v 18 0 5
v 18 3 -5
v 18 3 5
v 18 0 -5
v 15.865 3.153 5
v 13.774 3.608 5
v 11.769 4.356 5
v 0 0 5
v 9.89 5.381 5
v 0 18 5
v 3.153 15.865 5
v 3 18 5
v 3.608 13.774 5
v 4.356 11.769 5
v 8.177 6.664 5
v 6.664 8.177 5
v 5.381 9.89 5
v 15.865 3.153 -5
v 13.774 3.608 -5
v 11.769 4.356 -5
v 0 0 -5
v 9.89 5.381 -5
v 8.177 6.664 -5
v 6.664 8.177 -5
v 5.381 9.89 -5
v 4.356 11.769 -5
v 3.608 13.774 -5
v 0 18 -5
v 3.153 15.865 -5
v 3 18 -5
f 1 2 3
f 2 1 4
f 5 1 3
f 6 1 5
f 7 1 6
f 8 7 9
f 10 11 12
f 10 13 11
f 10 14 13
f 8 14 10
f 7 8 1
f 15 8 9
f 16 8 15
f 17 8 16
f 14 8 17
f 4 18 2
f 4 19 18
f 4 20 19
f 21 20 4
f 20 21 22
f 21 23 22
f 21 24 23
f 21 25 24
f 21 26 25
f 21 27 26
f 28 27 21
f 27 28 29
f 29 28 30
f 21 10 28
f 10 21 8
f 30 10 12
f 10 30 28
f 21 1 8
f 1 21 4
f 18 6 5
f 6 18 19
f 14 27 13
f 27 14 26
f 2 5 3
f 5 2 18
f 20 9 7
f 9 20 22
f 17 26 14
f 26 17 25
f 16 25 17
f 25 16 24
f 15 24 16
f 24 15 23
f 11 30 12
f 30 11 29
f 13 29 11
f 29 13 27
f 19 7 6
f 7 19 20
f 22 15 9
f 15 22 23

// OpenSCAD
// file: attach.scad
//---------------------------------------------------------------
//-- Openscad Attachment library
//-- Attach parts easily. Make your designs more reusable and clean
//---------------------------------------------------------------
//-- This is a component of the obiscad opescad tools by Obijuan
//-- (C) Juan Gonzalez-Gomez (Obijuan)
//-- Sep-2012
//---------------------------------------------------------------
//-- Released under the GPL license
//---------------------------------------------------------------

use <vector.scad>

//--------------------------------------------------------------------
//-- Draw a connector
//-- A connector is defined a 3-tuple that consist of a point
//--- (the attachment point), and axis (the attachment axis) and
//--- an angle the connected part should be rotate around the 
//--  attachment axis
//--
//--- Input parameters:
//--
//--  Connector c = [p , n, ang] where:
//--
//--     p : The attachment point
//--     v : The attachment axis
//--   ang : the angle
//--------------------------------------------------------------------
module connector(c)
{
  //-- Get the three components from the connector
  p = c[0];
  v = c[1];
  ang = c[2];

  //-- Draw the attachment poing
  color("Gray") point(p);

  //-- Draw the attachment axis vector (with a mark)
  translate(p)
    rotate(a=ang, v=v)
    color("Gray") vector(unitv(v)*6, l_arrow=2, mark=true);
}


//-------------------------------------------------------------------------
//--  ATTACH OPERATOR
//--  This operator applies the necesary transformations to the 
//--  child (attachable part) so that it is attached to the main part
//--  
//--  Parameters
//--    a -> Connector of the main part
//--    b -> Connector of the attachable part
//-------------------------------------------------------------------------
module attach(a,b)
{
  //-- Get the data from the connectors
  pos1 = a[0];  //-- Attachment point. Main part
  v    = a[1];  //-- Attachment axis. Main part
  roll = a[2];  //-- Rolling angle
  
  pos2 = b[0];  //-- Attachment point. Attachable part
  vref = b[1];  //-- Atachment axis. Attachable part
                //-- The rolling angle of the attachable part is not used

  //-------- Calculations for the "orientate operator"------
  //-- Calculate the rotation axis
  raxis = cross(vref,v);
    
  //-- Calculate the angle between the vectors
  ang = anglev(vref,v);
  //--------------------------------------------------------.-

  //-- Apply the transformations to the child ---------------------------

  //-- Place the attachable part on the main part attachment point
  translate(pos1)
    //-- Orientate operator. Apply the orientation so that
    //-- both attachment axis are paralell. Also apply the roll angle
    rotate(a=roll, v=v)  rotate(a=ang, v=raxis)
      //-- Attachable part to the origin
      translate(-pos2)
	child(0); 
}


//--------------------------------------------------------------------
//---   An example of the attach operator
//---  
//---  There are two parts: the main body and an arm
//---  They both are cubes (for simplicity)
//---
//--   In the main body there are 2 connectors defined, so that
//--  the arm can be attached to any of them (or both if you like)
//------------------------------------------------------------------

//-- In the debug mode the connectors and additional information
//-- are shown
debug=true;

//-- Define the Main part: A cube
//-- Two attachment points are defined: one on the top, another in the
//--- left side
size = [10,10,10];

//-- Connectors defined:

//--     Att. point       Att. Axis  Roll
c1 = [ [0,0,size[2]/2],  [0,0,1],     20];  //-- Connector on the top
c2 = [ [-size[0]/2,0,0], [-1,0,0],    90];  //-- Connector on the left


//-- Draw the main part along with the connectors (for debugging)
cube(size,center=true);

//-- In debug mode: Draw the main part connectors!
if (debug) {
  connector(c1);
  connector(c2);
}

//-- Define the Attachable part. It is another cube, with one connector
asize = [5,20,3];
a = [ [0,asize[1]/2-3,-asize[2]/2], [0,0,1], 0  ];


//-- Do the attach!
//-- Just change c1 by c2 to attach the part to the other 
//-- connector. Super-easy!! :-)
//-- Modify the c1 and c2 roll angle for rotating the attachable
//--  part to the desired orientation
attach(c1,a)
  //-- This is the attachable part! 
  union() {
    cube(asize,center=true);  //-- The part

    //-- In debug mode show additional info:
    if (debug) {
      frame(l=10);    //-- The part frame of reference.
      connector(a);   //-- Show the part connector
    }
  };

  
// main file
//---------------------------------------------------------------
//-- Openscad Bevel library
//-- Bevel the edges or add buttress to your parts!
//---------------------------------------------------------------
//-- This is a component of the obiscad opescad tools by Obijuan
//-- (C) Juan Gonzalez-Gomez (Obijuan)
//-- Sep-2012
//---------------------------------------------------------------
//-- Released under the GPL license
//---------------------------------------------------------------
use <vector.scad>
use <attach.scad>


//-----------------------------------------------------------------
//- Rotate a vector an angle teta around the axis given by the
//-- unit vector k
//-----------------------------------------------------------------
function Rot_axis_ang(p,k,teta) =
  p*cos(teta) + cross(k,p*sin(teta)) + k*dot(k,p)*(1-cos(teta));

//-- Transformation defined by rotating vfrom vector to vto
//-- It is applied to vector v
//-- It returns the transformed vector
function Tovector(vfrom, vto, v) = 
   Rot_axis_ang(v, unitv(cross(vfrom,vto)), anglev(vfrom,vto));

//-- Auxiliary function for extending a vector of 3 components to 4
function ev(v,c=0) = [v[0], v[1], v[2], c];

//-- Calculate the determinant of a matrix given by 3 row vectors
function det(a,b,c) = 
   a[0]*(b[1]*c[2]-b[2]*c[1])
 - a[1]*(b[0]*c[2]-b[2]*c[0])  
 + a[2]*(b[0]*c[1]-b[1]*c[0]);


//-- Sign function. It only returns 2 values: -1 when x is negative,
//-- or 1 when x=0 or x>0
function sign2(x) = sign(x)+1 - abs(sign(x));

//--------------------------------------------------------------------
//-- Beveled concave corner
//-- NOT AN INTERFACE MODULE (The user should call bconcave_corner instead)
//--
//-- Parameters:
//--   * cr: Corner radius
//--   * cres: Corner resolution
//--   * l: Length
//-    * th: Thickness
//--------------------------------------------------------------------
module bconcave_corner_aux(cr,cres,l,th)
{
  
  //-- vector for translating the  main cube
  //-- so that the top rigth corner is on the origin
  v1 = -[(cr+th)/2, (cr+th)/2, 0];

  //-- The part frame of reference is on the
  //-- internal corner
  v2 = [cr,cr,0];

  //-- Locate the frame of ref. in the internal
  //-- corner
  translate(v2)
  difference() {

    //-- Main cube for doing the corner
    translate(v1)
        //color("yellow",0.5)
        cube([cr+th, cr+th, l],center=true);
 
    //-- Cylinder used for beveling...
    cylinder(r=cr, h=l+1, center=true, $fn=4*(cres+1));
  }
}


//-----------------------------------------------------------------------------
//-- API MODULE
//--
//-- Beveled concave corner
//--
//-- Parameters:
//--   * cr: Corner radius
//--   * cres: Corner resolution
//--   * l: Length
//-    * th: Thickness
//--   * ext_corner: Where the origin is locate. By default it is located
//--       in the internal corner (concave zone). If true, 
//--       it will be in the external corner (convex zone)
//----------------------------------------------------------------------------
module bconcave_corner(cr=1,cres=4,th=1,l=10,ext_corner=false)
{
  //-- Locate the origin in the exterior edge
  if (ext_corner==true)
    translate([th,th,0]) 
      bconcave_corner_aux(cr,cres,l,th);
  else
     //-- Locate the origin in the interior edge
     translate([0.01, 0.01,0])
       bconcave_corner_aux(cr,cres,l,th);
}

//----------------------------------------------------------------------
//-- Auxiliary module (NOT FOR THE USER!)
//-- It is and standar "attach", particularized for placing concave
//-- corners
//----------------------------------------------------------------------
module bconcave_corner_attach_final(
        cfrom,  //-- Origin connector
        cto,    //-- Target connector
        cr,
        cres,
        l,
        th,
        ext_corner)
{
 
  //-- This block represent an attach operation
  //-- It is equivalent to:  attach(cto,cfrom)
  translate(cto[0])
    rotate(a=cto[2], v=cto[1])
      rotate(a=anglev(cfrom[1],cto[1]), 
             v=cross(cfrom[1],cto[1]) )
        translate(-cfrom[0]) 

  //-- Place the concave corner (along with some debug information)
  union() {
    //color("Blue")
    //connector(cfrom);
    //connector([cfrom[0],cnormal_v,0]);
    bconcave_corner(cr=cr,
             cres=cres, 
             l=l,
             th=th,
             ext_corner=ext_corner);
  }
}


//-------------------------------------------------------------------------
//-- Auxiliary module (NOT FOR THE USER!)
//-- It is the general module for performing the bconcave corner attach
//-- All the parameters should be passed to it
//--
//--  External connectors are where de concave corner will be placed. They
//--  are provided by the user
//--
//--  Internal connectors refers to the connectors of the concave corner
//--
//--  Then an attach between the internal and external connectors is done
//-------------------------------------------------------------------------
module bconcave_corner_attach_aux(

         //-- External connectors
         edge_c, 
         normal_c,

         //-- Internal connectors
         iedge_c,
         inormal_c,

	 //-- Other params
         cr,
         cres,
         th,
         l,
         ext_corner)

{
  //-- Get the Corner vectors from the internal connectors
  cedge_v = iedge_c[1];         //-- Corner edge vector
  cnormal_v = inormal_c[1];     //-- Corner normal vector

  //-- Get the vector paralell and normal to the edge
  //-- From the external connectors
  edge_v = edge_c[1];      //-- Edge verctor
  enormal_v = normal_c[1]; //-- Edge normal vector

  //---------------------------------------------------------------
  //-- For doing a correct attach, first the roll angle for the  
  //-- external connector should be calculated. It determines the
  //-- orientation of the concave corner around the edge vector
  //--
  //-- This orientation is calculated using the edge normal vectors
  //-- that bisec the corner
  //--
  //-- There are 2 different cases: depending on the relative angle
  //-- between the internal and external edges. They can be parallel
  //-- or not
  //-----------------------------------------------------------------
  //-- The roll angle has two components: the value and the sign

  //-- Calculate the sign of the rotation (the sign of roll)
  s=sign2(det(cnormal_v,enormal_v,edge_v));

  //-- Calculate the roll when the edges are paralell
  rollp = s*anglev(cnormal_v, enormal_v);

  //-- Calculate the roll in the general case
  Tcnormal_v = Tovector(cedge_v, edge_v, cnormal_v);
  rollg=s*anglev(Tcnormal_v, enormal_v);

  //-- For the paralell case... use rollp
  if (mod(cross(cedge_v,edge_v))==0) {
    //echo("Paralell");

     //-- Place the concave bevel corner!
     bconcave_corner_attach_final(
       cfrom = [[0,0,0],   cedge_v,   0],
       cto   = [edge_c[0], edge_c[1], rollp],
       cr    = cr,
       cres  = cres,
       l     = l,
       th    = th,
       ext_corner = ext_corner);
  }

  //-- For the general case, use rollg
  else {
    //echo("not paralell");

     //-- Place the concave bevel corner!
     bconcave_corner_attach_final(
       cfrom = [[0,0,0],   cedge_v,   0],
       cto   = [edge_c[0], edge_c[1], rollg],
       cr    = cr,
       cres  = cres,
       l     = l,
       th    = th,
       ext_corner = ext_corner);
  }
}

//---------------------------------------------------------------------------
//-- API MODULE
//--
//--  Bevel an edge. A concave corner is located so that the calling 
//--  module can easily perform a difference() operation
//--
//--  Two connectors are needed:
//--    * edge_c   : Connector located on the edge, paralell to the edge
//--    * normal_c : Connector located on the same point than edge_c 
//--                 pointing to the internal corner part, in the direction
//--                 of the corner bisector
//--    * cr        : Corner radius
//--    * cres      : Corner resolution
//--    * l         : Corner length
//--------------------------------------------------------------------------  
module bevel(
           edge_c, 
           normal_c,
           cr=3,
           cres=3,
           l=5)
{

  //-- Call the general module with the correct internal connectors
  bconcave_corner_attach_aux(

         //-- External connectors
         edge_c   = edge_c,
         normal_c = normal_c,

	 //-- Internal connectors 
         iedge_c   = [[0,0,0], unitv([0,0,1]), 0],
         inormal_c = [[0,0,0], [-1,-1,0]       , 0],

         //-- The other params
         cr=cr,
         cres=cres,
         l=l,
         th=1,
         ext_corner=false);
}


//---------------------------------------------------------------------------
//-- API MODULE
//--
//--  Attach a Beveled concave corner
//--  Two connectors are needed:
//--    * edge_c   : Connector located on the edge, paralell to the edge
//--    * normal_c : Connector located on the same point than edge_c 
//--                 pointing to the internal corner part, in the direction
//--                 of the corner bisector
//--    * cr        : Corner radius
//--    * cres      : Corner resolution
//--    * l         : Corner length
//--    * th        : Corner thickness (not visible when ext_corner=false)
//--    * ext_corner: If the exterior corner is used as a reference
//--------------------------------------------------------------------------  
module bconcave_corner_attach(
           edge_c, 
           normal_c,
           cr=3,
           cres=3,
           l=5, 
           th=1,
           ext_corner=false)
{

  //-- Call the general module with the correct internal connectors
  bconcave_corner_attach_aux(

         //-- External connectors
         edge_c   = edge_c,
         normal_c = normal_c,

	 //-- Internal connectors 
         iedge_c   = [[0,0,0], unitv([0,0,1]), 0],
         inormal_c = [[0,0,0], [1,1,0]       , 0],

         //-- The other params
         cr=cr,
         cres=cres,
         l=l,
         th=th,
         ext_corner=ext_corner);

}
  
//-----------------------------------------------------------
//---   TEST MODULES
//-----------------------------------------------------------

//-----------------------------------------------------------------
//--  Testing the Bevel operator... All the 12 edges of a cube
//--  are beveled. All the cases are covered, so it is a good
//--  test for finding bugs!
//----------------------------------------------------------------
module Test1_beveled_cube()
{
  //-------- Main object
  size=[30,30,30];


  //-- Define all the edges connectors
  ec1 = [[size[0]/2, 0,size[2]/2], [0,1,0], 0];
  en1 = [ec1[0],                   [1,0,1], 0];

  ec2 = [[-size[0]/2, 0,size[2]/2], [0,1,0], 0];
  en2 = [ec2[0],                   [-1,0,1], 0];

  ec3 = [[-size[0]/2, 0,-size[2]/2], [0,1,0], 0];
  en3 = [ec3[0],                   [-1,0,-1], 0];

  ec4 = [[size[0]/2, 0,-size[2]/2], [0,1,0], 0];
  en4 = [ec4[0],                   [1,0,-1], 0];

  ec5 = [[0, size[0]/2,size[2]/2], [1,0,0], 0];
  en5 = [ec5[0],                   [0,1,1], 0];

  ec6 = [[0, -size[0]/2,size[2]/2], [1,0,0], 0];
  en6 = [ec6[0],                   [0,-1,1], 0];

  ec7 = [[0, -size[0]/2,-size[2]/2], [1,0,0], 0];
  en7 = [ec7[0],                   [0,-1,-1], 0];

  ec8 = [[0, size[0]/2,-size[2]/2], [1,0,0], 0];
  en8 = [ec8[0],                    [0,1,-1], 0];

  ec9 = [[size[2]/2, size[0]/2,0 ], [0,0,1], 0];
  en9 = [ec9[0],                    [1,1,0], 0];

  ec10 = [[size[2]/2, -size[0]/2,0 ], [0,0,1], 0];
  en10 = [ec10[0],                    [1,-1,0], 0];

  ec11 = [[-size[2]/2, -size[0]/2,0 ], [0,0,1], 0];
  en11 = [ec11[0],                    [-1,-1,0], 0];

  ec12 = [[-size[2]/2, size[0]/2,0 ], [0,0,1], 0];
  en12 = [ec12[0],                    [-1,1,0], 0];


  //-- for Debuging... Show a specefic connector
  *connector(ec12);
  *connector(en12);

  //-- Parameters for all the beveled edges
  //-- It can be changed for testing
  cr=2;
  cres=0;

  //-- Remove from the main cube the concave corner parts
  difference() {

    //-- Draw the main cube
    cube(size,center=true); 

    //-- Attach the concave corners for beveling!
    bevel(ec1,en1,cr=cr,cres=0, l=size[1]+2);
    bevel(ec2,en2,cr=cr,cres=0, l=size[1]+2);
    bevel(ec3,en3,cr=cr,cres=0, l=size[1]+2);
    bevel(ec4,en4,cr=cr,cres=0, l=size[1]+2);

    bevel(ec5,en5,cr=cr,cres=0, l=size[0]+2);
    bevel(ec6,en6,cr=cr,cres=0, l=size[0]+2);
    bevel(ec7,en7,cr=cr,cres=0, l=size[0]+2);
    bevel(ec8,en8,cr=cr,cres=0, l=size[0]+2);

    bevel(ec9,en9,cr=cr,cres=0, l=size[0]+2);
    bevel(ec10,en10,cr=cr,cres=0, l=size[0]+2);
    bevel(ec11,en11,cr=cr,cres=0, l=size[0]+2);
    bevel(ec12,en12,cr=cr,cres=0, l=size[0]+2);

  }
}

//----------------------------------------------------------------
//-- Testing the bconcave_corner_attach operator
//-- It is used for adding buttress between two ortogonal parts
//----------------------------------------------------------------
module Test2_buttress()
{
  size=[30,30,30];
  th=3;
  l=2;
  cr = 6;
 

  //-- A cross. It divides the space in 4 quadrants
  difference() {  
    cube(size,center=true);
    translate([size[0]/4 + th/2, 0, size[0]/4 + th/2])
      cube([size[0]/2, size[1]+2, size[2]/2],center=true);

    translate([-size[0]/4 - th/2, 0, size[0]/4 + th/2])
      cube([size[0]/2, size[1]+2, size[2]/2],center=true);

    translate([-size[0]/4 - th/2, 0, -size[0]/4 - th/2])
      cube([size[0]/2, size[1]+2, size[2]/2],center=true);

    translate([size[0]/4 + th/2, 0, -size[0]/4 - th/2])
      cube([size[0]/2, size[1]+2, size[2]/2],center=true);
  }

  ec1 = [[th/2, size[1]/2-l/2, th/2], [0,1,0], 0];
  en1 = [ec1[0],[1,0,1],0];

  ec2 = [[th/2, -size[1]/2+l/2, th/2], [0,1,0], 0];
  en2 = [ec2[0],[1,0,1],0];

  ec3 = [[-th/2, 0, th/2], [0,1,0], 0];
  en3 = [ec3[0],[-1,0,1],0];

  ec4 = [[-th/2, 0, -th/2], [0,1,0], 0];
  en4 = [ec4[0],[-1,0,-1],0]; 

  ec5 = [[th/2, 0, -th/2], [0,1,0], 0];
  en5 = [ec5[0],[1,0,-1],0]; 

  *connector(ec5);
  *connector(en5);
 
  //-- quadrant 1:  two buttress
  bconcave_corner_attach(ec1,en1,cr, l=l, cres=0);
  bconcave_corner_attach(ec2,en2,cr, l=l, cres=0);
  
  //-- quadrant 2:  one bit buttress
  bconcave_corner_attach(ec3,en3,cr=3, l=size[1], cres=0);

  //-- quadrant 3: a Rounded buttress
  bconcave_corner_attach(ec4,en4,cr=8, l=size[1], cres=5);

  //-- Quadrant 4: A rounded buttress in the middle
  bconcave_corner_attach(ec5,en5,cr=8, l=size[1]/3, cres=5);

}

//-------------------------------------------------------------------
//--   TESTS
//-------------------------------------------------------------------

//-- example 1: A beveled concave corner
bconcave_corner(cr=15, cres=10, l=10, th=3, ext_corner=true);

//-- Example 2: Testing the bevel() operator
//Test1_beveled_cube();

//-- Example 3: Testing the bconcave_corner_attach() operator
//Test2_buttress();
